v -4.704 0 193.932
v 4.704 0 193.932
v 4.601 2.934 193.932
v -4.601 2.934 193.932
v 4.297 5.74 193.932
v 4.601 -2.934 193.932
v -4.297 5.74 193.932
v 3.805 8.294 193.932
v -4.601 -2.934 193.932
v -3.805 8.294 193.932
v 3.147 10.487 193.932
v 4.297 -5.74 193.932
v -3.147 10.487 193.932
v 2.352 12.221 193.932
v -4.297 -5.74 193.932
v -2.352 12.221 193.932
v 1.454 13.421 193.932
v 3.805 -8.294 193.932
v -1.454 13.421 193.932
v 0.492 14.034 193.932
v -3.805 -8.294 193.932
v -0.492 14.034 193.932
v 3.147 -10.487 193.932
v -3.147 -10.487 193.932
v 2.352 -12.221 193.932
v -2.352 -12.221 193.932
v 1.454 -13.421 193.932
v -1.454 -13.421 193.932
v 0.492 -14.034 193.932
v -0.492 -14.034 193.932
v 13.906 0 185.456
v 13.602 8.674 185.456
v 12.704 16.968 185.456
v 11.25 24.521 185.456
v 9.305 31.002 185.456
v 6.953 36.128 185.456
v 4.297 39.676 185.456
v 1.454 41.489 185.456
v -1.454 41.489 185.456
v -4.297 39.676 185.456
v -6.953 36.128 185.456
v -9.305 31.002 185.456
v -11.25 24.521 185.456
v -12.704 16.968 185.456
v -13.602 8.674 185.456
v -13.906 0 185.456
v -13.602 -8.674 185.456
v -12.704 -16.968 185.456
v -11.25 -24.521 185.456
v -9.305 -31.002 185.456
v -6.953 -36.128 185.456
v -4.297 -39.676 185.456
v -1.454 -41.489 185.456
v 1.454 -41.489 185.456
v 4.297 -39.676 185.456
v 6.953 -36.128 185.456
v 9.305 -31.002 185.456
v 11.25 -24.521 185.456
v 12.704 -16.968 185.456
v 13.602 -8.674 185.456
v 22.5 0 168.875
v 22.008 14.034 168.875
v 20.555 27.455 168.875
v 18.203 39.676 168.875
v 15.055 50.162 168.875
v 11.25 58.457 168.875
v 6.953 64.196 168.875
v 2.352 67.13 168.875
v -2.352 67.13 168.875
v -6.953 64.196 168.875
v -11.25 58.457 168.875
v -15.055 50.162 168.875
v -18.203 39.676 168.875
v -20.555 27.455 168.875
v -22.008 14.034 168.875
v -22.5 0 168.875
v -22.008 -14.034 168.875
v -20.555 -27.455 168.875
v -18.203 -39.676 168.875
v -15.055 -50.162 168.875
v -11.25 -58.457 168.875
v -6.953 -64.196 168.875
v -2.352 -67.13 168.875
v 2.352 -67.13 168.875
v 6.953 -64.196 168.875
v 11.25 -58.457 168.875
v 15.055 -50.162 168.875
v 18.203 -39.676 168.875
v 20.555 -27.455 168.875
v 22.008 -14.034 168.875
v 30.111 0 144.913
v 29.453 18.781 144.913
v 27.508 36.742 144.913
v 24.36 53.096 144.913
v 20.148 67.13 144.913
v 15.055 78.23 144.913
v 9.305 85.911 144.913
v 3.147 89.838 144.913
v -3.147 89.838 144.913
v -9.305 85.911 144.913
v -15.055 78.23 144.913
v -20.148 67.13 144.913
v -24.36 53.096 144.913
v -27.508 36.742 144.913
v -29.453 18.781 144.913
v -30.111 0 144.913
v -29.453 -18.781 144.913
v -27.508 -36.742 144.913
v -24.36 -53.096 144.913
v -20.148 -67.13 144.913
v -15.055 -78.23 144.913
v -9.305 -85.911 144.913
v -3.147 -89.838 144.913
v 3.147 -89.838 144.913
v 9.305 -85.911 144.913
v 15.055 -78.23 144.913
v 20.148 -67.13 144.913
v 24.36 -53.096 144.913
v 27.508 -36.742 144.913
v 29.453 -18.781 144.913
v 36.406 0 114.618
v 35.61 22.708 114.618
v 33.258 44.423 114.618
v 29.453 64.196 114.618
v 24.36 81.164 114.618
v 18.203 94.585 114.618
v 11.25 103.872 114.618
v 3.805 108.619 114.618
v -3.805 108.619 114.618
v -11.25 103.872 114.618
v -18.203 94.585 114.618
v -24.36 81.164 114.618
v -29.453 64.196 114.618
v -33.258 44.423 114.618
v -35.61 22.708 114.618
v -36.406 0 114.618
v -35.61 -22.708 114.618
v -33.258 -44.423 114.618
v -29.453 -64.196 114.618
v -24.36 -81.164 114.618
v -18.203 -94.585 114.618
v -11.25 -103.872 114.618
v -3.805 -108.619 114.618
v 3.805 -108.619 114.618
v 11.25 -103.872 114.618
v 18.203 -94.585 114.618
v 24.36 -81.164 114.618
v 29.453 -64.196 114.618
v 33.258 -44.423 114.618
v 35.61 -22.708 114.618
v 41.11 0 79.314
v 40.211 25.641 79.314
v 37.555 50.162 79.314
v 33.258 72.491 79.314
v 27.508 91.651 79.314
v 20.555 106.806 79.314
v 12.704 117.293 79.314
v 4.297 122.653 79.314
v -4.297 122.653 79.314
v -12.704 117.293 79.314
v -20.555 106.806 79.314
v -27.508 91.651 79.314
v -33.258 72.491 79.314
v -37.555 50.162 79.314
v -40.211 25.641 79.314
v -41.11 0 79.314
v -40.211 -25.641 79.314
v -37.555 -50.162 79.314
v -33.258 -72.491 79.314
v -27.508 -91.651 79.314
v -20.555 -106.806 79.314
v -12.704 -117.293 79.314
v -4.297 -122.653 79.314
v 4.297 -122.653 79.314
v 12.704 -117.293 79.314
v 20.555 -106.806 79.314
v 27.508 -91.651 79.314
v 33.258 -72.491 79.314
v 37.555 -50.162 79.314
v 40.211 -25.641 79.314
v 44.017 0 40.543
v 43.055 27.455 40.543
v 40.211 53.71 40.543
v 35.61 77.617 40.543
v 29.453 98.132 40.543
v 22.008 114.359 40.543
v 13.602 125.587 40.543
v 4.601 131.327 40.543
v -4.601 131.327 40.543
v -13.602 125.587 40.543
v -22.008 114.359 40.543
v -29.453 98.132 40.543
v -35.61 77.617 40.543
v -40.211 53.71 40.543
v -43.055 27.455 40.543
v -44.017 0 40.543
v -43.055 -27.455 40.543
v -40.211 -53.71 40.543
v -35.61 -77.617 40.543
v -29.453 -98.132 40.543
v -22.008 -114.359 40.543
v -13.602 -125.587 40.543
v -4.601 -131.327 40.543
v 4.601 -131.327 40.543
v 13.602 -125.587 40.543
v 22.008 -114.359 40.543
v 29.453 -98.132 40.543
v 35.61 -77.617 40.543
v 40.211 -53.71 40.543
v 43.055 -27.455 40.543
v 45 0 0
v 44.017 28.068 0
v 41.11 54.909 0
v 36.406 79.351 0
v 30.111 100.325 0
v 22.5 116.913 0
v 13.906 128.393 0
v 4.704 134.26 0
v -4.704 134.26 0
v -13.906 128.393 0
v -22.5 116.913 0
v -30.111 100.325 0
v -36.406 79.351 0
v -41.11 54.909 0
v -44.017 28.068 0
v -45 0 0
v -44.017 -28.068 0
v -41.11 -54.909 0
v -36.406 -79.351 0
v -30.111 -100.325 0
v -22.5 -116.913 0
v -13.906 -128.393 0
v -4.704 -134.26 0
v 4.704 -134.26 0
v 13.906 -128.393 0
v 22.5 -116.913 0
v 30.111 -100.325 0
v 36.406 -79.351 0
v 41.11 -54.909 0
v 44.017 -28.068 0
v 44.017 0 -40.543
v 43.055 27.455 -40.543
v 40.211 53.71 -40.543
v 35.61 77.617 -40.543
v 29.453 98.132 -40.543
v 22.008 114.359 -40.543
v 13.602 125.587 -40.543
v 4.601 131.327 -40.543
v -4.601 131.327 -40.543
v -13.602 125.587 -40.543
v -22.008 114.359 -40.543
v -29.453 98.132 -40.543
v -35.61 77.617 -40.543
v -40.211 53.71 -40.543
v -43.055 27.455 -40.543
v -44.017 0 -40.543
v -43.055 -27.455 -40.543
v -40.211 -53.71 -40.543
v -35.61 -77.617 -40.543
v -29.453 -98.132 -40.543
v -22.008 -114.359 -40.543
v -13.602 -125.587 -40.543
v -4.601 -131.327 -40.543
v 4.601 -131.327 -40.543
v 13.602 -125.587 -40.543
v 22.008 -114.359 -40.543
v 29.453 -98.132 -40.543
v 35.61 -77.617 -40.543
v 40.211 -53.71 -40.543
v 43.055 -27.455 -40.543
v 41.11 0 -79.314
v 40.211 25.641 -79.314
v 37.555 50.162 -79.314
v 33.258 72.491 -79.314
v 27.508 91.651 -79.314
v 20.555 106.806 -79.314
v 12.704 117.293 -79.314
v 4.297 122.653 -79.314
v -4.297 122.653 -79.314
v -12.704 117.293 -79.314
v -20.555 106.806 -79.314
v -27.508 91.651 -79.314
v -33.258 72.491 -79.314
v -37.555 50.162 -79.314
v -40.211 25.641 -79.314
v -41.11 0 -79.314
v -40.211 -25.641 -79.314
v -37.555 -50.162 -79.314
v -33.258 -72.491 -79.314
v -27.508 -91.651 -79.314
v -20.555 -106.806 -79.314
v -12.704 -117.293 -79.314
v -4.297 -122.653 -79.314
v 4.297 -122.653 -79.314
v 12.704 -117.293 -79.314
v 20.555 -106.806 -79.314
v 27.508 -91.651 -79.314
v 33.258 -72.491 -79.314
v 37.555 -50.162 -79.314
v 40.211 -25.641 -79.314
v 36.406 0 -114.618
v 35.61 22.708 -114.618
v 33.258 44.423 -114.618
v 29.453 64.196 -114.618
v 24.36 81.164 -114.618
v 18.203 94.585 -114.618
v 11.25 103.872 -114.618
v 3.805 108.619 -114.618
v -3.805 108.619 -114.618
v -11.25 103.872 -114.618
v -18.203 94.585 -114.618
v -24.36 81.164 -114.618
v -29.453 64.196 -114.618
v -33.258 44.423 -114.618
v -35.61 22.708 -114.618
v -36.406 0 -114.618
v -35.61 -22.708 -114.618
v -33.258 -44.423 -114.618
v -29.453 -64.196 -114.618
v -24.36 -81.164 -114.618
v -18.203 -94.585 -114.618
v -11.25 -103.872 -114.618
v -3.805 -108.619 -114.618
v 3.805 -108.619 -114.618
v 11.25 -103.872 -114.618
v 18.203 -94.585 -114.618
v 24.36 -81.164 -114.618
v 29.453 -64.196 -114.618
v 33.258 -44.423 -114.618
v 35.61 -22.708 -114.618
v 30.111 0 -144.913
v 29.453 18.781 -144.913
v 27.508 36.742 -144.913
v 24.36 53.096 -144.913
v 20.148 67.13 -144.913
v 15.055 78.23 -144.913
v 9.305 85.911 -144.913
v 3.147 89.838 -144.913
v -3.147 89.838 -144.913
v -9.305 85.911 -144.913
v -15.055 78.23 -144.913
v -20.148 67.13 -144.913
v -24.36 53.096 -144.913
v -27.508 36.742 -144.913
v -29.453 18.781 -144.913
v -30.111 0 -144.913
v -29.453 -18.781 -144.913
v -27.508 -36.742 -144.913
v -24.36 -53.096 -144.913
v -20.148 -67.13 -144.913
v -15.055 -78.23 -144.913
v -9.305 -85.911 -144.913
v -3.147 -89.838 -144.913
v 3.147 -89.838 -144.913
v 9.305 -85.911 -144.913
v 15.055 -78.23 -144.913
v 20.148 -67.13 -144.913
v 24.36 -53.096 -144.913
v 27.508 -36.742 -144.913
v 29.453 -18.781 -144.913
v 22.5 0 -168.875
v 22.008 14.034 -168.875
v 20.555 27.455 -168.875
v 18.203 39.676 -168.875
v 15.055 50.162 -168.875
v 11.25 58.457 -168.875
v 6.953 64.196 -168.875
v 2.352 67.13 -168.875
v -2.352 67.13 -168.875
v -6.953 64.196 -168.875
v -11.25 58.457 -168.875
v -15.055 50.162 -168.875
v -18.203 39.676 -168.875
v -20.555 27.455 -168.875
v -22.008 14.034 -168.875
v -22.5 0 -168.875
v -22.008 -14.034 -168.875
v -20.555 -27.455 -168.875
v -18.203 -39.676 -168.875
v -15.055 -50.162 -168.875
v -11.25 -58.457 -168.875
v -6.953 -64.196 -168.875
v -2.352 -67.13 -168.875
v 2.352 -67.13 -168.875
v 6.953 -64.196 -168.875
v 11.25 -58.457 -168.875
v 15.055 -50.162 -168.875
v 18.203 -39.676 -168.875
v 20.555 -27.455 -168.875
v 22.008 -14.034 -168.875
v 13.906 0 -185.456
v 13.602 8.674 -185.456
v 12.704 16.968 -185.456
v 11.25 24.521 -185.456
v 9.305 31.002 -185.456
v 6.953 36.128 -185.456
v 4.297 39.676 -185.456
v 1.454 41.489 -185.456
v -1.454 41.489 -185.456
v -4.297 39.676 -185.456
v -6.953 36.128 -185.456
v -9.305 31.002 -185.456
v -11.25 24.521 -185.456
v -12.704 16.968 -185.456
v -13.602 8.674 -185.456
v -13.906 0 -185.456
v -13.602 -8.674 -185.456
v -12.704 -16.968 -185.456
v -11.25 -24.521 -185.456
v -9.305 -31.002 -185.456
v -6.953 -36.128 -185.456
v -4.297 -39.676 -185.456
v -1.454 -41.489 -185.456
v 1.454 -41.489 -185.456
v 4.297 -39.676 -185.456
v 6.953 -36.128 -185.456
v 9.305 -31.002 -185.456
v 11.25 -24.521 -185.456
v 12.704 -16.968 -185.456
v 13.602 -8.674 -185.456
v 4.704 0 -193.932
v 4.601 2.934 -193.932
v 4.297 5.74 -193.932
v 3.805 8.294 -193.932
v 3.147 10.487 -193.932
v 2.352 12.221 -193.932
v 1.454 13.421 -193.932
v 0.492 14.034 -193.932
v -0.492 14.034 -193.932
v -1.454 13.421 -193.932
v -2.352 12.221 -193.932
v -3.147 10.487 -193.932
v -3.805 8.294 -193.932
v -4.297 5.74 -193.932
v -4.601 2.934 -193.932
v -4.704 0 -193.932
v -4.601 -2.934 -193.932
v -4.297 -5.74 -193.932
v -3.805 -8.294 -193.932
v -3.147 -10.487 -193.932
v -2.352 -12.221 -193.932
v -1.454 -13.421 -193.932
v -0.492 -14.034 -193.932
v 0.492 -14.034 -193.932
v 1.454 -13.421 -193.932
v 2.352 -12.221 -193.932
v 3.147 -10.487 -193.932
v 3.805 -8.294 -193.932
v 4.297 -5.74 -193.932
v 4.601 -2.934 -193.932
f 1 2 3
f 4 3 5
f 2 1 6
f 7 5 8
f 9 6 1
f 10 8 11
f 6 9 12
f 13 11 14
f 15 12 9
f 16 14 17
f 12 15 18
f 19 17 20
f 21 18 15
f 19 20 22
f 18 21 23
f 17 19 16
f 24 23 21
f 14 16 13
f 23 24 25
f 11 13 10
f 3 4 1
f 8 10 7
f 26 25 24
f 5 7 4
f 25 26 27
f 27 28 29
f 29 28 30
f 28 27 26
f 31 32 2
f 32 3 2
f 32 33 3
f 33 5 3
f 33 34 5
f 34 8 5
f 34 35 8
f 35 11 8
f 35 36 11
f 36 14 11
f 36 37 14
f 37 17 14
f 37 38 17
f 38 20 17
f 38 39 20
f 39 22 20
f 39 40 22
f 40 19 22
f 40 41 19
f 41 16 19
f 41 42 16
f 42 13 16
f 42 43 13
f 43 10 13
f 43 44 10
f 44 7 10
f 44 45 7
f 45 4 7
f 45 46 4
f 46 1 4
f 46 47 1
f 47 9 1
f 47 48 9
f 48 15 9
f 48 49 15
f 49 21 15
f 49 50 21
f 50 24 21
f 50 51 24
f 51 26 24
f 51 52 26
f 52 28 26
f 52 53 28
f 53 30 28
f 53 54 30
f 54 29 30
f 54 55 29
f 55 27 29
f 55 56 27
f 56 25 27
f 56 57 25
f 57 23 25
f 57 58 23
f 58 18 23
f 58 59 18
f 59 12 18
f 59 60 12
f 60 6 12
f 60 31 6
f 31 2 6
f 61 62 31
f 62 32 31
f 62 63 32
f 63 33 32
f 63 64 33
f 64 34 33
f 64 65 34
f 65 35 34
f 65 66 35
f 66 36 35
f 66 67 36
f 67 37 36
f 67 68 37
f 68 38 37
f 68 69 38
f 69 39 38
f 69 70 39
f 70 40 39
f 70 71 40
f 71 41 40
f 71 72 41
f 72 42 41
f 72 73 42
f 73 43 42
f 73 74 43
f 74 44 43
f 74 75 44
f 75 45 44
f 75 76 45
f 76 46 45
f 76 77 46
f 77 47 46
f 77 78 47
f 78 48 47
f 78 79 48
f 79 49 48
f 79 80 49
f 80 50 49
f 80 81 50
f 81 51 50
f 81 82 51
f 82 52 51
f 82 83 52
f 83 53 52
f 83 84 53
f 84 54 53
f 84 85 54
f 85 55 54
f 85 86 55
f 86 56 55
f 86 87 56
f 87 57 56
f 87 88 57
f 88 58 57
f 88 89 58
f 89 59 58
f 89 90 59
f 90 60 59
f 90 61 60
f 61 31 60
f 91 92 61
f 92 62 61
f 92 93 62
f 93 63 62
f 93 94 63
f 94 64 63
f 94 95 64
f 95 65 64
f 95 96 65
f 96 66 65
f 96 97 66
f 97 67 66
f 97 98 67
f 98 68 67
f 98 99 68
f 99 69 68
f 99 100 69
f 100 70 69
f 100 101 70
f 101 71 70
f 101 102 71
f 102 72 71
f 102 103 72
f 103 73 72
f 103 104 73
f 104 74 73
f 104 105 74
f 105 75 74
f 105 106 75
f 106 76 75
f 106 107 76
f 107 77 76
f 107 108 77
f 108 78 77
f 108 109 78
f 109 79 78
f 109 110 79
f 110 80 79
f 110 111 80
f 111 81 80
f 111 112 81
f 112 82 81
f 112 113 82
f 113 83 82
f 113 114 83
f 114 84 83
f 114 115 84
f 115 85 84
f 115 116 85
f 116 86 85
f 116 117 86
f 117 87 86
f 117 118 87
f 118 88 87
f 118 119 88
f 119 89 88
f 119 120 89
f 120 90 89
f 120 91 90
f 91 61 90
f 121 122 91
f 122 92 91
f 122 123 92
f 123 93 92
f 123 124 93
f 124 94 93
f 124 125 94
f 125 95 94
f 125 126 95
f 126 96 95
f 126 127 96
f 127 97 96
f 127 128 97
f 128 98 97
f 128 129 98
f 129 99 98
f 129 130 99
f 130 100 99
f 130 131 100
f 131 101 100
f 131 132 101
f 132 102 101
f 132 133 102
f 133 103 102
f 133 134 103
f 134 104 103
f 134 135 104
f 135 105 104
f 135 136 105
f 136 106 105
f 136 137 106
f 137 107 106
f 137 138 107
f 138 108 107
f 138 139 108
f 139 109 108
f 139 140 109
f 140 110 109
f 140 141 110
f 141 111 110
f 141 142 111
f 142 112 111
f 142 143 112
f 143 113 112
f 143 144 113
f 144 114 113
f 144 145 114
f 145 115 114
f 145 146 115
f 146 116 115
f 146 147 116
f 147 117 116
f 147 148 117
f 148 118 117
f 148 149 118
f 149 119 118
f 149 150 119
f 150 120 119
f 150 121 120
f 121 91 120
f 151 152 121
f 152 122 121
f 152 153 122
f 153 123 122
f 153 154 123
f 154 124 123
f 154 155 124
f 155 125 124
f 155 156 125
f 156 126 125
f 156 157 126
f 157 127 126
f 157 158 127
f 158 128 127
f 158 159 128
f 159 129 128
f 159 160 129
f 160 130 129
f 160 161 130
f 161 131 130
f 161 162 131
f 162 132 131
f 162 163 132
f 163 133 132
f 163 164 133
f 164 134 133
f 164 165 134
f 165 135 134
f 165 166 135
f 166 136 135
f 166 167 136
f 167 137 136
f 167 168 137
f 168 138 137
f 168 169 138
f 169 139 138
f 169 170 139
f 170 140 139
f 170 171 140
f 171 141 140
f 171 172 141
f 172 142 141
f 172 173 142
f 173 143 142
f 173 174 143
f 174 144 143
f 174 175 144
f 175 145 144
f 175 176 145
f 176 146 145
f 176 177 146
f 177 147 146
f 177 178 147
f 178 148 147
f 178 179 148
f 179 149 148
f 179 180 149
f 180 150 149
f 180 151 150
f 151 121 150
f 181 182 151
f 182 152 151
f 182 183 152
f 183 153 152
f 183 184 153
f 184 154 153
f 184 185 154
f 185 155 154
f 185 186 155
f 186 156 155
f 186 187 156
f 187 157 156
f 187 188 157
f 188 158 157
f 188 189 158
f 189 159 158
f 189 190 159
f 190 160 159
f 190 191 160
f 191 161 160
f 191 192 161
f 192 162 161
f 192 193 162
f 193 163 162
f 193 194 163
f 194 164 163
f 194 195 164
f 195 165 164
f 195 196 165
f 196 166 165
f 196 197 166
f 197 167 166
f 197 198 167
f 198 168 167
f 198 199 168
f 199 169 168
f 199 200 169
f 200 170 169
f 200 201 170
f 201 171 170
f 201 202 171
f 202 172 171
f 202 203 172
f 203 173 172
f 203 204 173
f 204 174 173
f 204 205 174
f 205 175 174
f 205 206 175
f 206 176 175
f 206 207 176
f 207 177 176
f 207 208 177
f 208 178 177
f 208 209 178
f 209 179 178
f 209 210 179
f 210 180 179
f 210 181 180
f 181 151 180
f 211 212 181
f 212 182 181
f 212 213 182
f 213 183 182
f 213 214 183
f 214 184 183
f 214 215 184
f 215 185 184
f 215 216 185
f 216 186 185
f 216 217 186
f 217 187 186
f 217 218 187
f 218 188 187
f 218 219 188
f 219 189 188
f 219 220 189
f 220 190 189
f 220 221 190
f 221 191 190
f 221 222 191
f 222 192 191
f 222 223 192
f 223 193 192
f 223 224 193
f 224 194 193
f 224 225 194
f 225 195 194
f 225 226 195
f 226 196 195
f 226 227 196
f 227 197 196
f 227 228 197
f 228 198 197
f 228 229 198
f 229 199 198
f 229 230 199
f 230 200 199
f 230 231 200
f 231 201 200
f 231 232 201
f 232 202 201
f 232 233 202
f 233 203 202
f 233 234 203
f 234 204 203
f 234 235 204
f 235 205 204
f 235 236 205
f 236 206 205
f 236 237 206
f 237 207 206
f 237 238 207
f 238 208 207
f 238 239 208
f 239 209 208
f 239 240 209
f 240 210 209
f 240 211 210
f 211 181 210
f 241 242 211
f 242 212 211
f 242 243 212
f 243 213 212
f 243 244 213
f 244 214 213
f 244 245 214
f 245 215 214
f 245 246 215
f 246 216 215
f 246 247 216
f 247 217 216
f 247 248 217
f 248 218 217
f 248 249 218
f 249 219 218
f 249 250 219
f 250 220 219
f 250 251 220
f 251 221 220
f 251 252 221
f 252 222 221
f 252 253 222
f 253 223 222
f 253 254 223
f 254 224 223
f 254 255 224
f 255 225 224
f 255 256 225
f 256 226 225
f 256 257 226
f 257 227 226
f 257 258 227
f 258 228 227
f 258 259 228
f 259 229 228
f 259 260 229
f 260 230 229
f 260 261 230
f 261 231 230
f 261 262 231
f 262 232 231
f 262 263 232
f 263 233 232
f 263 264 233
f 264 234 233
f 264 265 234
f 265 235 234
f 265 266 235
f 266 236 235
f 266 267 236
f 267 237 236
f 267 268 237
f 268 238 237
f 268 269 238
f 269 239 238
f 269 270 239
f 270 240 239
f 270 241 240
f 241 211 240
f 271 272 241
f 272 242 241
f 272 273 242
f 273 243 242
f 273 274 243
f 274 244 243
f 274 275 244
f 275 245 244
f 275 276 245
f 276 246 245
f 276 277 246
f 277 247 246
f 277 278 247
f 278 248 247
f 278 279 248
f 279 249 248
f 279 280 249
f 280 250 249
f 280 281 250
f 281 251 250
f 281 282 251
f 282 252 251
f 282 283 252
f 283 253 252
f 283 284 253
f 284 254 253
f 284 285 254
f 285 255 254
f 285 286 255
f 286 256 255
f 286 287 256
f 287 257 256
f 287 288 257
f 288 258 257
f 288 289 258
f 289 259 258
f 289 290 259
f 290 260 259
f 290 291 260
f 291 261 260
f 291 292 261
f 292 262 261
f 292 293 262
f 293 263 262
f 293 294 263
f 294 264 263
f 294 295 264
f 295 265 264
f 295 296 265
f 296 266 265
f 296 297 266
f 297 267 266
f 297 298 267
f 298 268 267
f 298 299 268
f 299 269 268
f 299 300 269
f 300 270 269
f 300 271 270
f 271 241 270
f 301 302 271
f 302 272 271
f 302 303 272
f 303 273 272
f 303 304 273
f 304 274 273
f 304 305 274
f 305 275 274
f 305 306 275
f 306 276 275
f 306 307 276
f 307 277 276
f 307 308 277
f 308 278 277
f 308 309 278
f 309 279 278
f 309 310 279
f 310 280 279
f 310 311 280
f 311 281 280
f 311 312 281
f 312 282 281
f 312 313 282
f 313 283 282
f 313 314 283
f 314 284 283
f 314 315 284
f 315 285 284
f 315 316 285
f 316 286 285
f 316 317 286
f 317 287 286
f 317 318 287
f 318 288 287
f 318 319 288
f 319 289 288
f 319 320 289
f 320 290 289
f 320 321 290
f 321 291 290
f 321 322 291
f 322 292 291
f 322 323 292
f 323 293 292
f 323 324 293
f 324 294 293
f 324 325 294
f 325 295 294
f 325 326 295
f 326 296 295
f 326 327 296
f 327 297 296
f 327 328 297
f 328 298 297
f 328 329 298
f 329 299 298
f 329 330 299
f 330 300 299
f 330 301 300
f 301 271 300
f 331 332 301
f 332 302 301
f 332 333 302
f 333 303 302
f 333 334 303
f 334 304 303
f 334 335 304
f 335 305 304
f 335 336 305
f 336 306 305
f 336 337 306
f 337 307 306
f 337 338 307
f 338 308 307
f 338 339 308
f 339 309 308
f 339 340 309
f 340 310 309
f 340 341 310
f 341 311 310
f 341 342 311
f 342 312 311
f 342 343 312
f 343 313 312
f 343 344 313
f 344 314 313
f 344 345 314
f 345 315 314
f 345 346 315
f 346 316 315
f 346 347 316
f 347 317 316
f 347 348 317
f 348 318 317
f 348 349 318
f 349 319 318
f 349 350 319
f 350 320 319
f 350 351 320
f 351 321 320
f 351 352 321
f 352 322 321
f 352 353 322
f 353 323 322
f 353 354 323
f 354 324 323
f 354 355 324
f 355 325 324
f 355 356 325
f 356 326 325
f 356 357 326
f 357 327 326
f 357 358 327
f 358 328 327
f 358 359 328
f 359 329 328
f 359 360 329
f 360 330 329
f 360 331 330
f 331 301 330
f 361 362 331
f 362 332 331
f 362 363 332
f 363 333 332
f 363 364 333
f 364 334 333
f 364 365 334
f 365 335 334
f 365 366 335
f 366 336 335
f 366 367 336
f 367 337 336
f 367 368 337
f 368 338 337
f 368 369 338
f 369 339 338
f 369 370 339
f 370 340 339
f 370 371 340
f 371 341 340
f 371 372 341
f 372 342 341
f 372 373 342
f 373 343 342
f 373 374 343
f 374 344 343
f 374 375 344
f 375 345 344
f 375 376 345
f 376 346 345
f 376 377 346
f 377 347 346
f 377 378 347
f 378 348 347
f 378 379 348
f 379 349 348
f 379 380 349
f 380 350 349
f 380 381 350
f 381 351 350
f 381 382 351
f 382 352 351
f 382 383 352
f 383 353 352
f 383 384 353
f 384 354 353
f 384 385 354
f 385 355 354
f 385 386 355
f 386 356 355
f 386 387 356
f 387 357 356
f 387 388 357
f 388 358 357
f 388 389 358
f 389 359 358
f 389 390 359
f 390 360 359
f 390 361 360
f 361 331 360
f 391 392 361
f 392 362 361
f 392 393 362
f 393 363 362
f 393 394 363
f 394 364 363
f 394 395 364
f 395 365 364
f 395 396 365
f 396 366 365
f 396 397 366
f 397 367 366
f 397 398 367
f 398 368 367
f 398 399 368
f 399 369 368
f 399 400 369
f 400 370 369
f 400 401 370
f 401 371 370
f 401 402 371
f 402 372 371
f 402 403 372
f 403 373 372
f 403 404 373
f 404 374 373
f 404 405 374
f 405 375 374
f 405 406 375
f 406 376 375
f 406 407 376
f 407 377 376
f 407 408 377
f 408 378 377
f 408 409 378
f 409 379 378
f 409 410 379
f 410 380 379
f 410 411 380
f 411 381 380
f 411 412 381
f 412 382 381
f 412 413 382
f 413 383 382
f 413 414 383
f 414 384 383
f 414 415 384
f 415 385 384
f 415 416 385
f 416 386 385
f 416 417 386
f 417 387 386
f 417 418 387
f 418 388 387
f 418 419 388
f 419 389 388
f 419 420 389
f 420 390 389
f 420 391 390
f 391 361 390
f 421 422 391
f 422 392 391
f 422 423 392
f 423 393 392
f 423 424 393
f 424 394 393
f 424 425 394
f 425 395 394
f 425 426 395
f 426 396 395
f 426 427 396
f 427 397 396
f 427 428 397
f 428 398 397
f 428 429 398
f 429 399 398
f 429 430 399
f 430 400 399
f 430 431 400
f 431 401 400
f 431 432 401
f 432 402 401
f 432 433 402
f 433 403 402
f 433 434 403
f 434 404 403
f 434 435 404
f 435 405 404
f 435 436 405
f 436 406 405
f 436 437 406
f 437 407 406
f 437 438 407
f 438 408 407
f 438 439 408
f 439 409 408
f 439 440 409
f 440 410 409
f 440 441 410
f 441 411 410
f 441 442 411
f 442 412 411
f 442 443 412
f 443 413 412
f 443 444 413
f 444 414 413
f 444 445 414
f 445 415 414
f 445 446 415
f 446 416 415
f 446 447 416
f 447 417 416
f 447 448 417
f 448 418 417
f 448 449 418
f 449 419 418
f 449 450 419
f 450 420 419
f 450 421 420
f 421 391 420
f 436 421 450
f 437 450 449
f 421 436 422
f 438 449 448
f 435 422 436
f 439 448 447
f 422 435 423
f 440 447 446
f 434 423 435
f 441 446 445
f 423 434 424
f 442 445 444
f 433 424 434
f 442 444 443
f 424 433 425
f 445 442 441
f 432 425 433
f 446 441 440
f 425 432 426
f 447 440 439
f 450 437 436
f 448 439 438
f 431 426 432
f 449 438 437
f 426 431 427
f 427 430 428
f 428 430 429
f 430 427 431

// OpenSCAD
// Generated by SolidPython 1.0.1 on 2020-07-29 00:46:45


scale(v = [3, 9, 13]) {
	sphere(r = 15);
}
/***********************************************
*********      SolidPython code:      **********
************************************************
 
# import packages: SolidPython
from solid import *
from solid.utils import *
from itertools import chain, combinations, permutations


class Resize:

    def __init__(self, scad_file):
        self.scad_file = scad_file
        #self.scad_file = import_scad(scad_file)
        # cone/cylinder param:
        self.r1 = 0
        self.r2 = 0
        self.h = 0
        # rectangular prism param:
        self.w = 0
        self.l = 0
        # ellipse param:
        self.r = 0

    # import OpenScad code (file name corresponds to shape)


    # classify shape + parameters
    def assign(self, param1, param2, param3):
        if self.scad_file == 'cone.scad':
            self.r1 = param1
            self.r2 = param2
            self.h = param3
        elif self.scad_file == 'cylinder.scad':
            self.r1 = param1
            self.r2 = param2
            self.h = param3
        elif self.scad_file == 'rectangularPrism.scad':
            self.h = param1
            self.l = param2
            self.w = param3
        else:
            self.r = param1
            self.h = param2

    # resize parameters
    def iterate(self):
        x = range(3, 20, 2)
        i = 1
        if self.scad_file == 'cone.scad':
            tempList = list(permutations(x, 2))
            for temp in tempList:
                param1 = temp[0]
                param2 = temp[1]
                filepath = 'produced_scad_files/' + 'cone' + str(param1) + '_' + str(param2) + '_' + '.scad'
                scad_render_to_file(cylinder(h=param1, r1=param2, r2=0), filepath)

        elif self.scad_file == 'cylinder.scad':
            tempList = list(permutations(x, 3))
            for temp in tempList:
                param1 = temp[0]
                param2 = temp[1]
                filepath = 'produced_scad_files/' + 'cylinder' + str(param1) + '_' + str(param2) + '_' + '.scad'
                scad_render_to_file(cylinder(h=param1, r1=param2, r2=param2), filepath)

        elif self.scad_file == 'rectangularPrism.scad':
            tempList = list(permutations(x, 3))
            for temp in tempList:
                param1 = temp[0]
                param2 = temp[1]
                param3 = temp[2]
                filepath = 'produced_scad_files/' + 'rectangularPrism' + str(param1) + '_' + str(param2) + '_' + str(
                    param3) + '.scad'
                scad_render_to_file(cube(size=(param1, param2, param3)), filepath)

        elif self.scad_file == 'ellipse.scad':
            tempList = list(permutations(x, 4))
            for temp in tempList:
                param1 = temp[0]
                param2 = temp[1]
                param3 = temp[2]
                param4 = temp[3]
                filepath = 'produced_scad_files/' + 'ellipse' + str(param1) + '_' + str(param2) + '_' + str(param3) + '_' + str(param4) + '.scad'
                scad_render_to_file(scale([param1, param2, param3])(sphere(r=param4)), filepath)

    def render_to_scadfile(self):
        scad_render_to_file(scad, 'example.scad') 
 
************************************************/
